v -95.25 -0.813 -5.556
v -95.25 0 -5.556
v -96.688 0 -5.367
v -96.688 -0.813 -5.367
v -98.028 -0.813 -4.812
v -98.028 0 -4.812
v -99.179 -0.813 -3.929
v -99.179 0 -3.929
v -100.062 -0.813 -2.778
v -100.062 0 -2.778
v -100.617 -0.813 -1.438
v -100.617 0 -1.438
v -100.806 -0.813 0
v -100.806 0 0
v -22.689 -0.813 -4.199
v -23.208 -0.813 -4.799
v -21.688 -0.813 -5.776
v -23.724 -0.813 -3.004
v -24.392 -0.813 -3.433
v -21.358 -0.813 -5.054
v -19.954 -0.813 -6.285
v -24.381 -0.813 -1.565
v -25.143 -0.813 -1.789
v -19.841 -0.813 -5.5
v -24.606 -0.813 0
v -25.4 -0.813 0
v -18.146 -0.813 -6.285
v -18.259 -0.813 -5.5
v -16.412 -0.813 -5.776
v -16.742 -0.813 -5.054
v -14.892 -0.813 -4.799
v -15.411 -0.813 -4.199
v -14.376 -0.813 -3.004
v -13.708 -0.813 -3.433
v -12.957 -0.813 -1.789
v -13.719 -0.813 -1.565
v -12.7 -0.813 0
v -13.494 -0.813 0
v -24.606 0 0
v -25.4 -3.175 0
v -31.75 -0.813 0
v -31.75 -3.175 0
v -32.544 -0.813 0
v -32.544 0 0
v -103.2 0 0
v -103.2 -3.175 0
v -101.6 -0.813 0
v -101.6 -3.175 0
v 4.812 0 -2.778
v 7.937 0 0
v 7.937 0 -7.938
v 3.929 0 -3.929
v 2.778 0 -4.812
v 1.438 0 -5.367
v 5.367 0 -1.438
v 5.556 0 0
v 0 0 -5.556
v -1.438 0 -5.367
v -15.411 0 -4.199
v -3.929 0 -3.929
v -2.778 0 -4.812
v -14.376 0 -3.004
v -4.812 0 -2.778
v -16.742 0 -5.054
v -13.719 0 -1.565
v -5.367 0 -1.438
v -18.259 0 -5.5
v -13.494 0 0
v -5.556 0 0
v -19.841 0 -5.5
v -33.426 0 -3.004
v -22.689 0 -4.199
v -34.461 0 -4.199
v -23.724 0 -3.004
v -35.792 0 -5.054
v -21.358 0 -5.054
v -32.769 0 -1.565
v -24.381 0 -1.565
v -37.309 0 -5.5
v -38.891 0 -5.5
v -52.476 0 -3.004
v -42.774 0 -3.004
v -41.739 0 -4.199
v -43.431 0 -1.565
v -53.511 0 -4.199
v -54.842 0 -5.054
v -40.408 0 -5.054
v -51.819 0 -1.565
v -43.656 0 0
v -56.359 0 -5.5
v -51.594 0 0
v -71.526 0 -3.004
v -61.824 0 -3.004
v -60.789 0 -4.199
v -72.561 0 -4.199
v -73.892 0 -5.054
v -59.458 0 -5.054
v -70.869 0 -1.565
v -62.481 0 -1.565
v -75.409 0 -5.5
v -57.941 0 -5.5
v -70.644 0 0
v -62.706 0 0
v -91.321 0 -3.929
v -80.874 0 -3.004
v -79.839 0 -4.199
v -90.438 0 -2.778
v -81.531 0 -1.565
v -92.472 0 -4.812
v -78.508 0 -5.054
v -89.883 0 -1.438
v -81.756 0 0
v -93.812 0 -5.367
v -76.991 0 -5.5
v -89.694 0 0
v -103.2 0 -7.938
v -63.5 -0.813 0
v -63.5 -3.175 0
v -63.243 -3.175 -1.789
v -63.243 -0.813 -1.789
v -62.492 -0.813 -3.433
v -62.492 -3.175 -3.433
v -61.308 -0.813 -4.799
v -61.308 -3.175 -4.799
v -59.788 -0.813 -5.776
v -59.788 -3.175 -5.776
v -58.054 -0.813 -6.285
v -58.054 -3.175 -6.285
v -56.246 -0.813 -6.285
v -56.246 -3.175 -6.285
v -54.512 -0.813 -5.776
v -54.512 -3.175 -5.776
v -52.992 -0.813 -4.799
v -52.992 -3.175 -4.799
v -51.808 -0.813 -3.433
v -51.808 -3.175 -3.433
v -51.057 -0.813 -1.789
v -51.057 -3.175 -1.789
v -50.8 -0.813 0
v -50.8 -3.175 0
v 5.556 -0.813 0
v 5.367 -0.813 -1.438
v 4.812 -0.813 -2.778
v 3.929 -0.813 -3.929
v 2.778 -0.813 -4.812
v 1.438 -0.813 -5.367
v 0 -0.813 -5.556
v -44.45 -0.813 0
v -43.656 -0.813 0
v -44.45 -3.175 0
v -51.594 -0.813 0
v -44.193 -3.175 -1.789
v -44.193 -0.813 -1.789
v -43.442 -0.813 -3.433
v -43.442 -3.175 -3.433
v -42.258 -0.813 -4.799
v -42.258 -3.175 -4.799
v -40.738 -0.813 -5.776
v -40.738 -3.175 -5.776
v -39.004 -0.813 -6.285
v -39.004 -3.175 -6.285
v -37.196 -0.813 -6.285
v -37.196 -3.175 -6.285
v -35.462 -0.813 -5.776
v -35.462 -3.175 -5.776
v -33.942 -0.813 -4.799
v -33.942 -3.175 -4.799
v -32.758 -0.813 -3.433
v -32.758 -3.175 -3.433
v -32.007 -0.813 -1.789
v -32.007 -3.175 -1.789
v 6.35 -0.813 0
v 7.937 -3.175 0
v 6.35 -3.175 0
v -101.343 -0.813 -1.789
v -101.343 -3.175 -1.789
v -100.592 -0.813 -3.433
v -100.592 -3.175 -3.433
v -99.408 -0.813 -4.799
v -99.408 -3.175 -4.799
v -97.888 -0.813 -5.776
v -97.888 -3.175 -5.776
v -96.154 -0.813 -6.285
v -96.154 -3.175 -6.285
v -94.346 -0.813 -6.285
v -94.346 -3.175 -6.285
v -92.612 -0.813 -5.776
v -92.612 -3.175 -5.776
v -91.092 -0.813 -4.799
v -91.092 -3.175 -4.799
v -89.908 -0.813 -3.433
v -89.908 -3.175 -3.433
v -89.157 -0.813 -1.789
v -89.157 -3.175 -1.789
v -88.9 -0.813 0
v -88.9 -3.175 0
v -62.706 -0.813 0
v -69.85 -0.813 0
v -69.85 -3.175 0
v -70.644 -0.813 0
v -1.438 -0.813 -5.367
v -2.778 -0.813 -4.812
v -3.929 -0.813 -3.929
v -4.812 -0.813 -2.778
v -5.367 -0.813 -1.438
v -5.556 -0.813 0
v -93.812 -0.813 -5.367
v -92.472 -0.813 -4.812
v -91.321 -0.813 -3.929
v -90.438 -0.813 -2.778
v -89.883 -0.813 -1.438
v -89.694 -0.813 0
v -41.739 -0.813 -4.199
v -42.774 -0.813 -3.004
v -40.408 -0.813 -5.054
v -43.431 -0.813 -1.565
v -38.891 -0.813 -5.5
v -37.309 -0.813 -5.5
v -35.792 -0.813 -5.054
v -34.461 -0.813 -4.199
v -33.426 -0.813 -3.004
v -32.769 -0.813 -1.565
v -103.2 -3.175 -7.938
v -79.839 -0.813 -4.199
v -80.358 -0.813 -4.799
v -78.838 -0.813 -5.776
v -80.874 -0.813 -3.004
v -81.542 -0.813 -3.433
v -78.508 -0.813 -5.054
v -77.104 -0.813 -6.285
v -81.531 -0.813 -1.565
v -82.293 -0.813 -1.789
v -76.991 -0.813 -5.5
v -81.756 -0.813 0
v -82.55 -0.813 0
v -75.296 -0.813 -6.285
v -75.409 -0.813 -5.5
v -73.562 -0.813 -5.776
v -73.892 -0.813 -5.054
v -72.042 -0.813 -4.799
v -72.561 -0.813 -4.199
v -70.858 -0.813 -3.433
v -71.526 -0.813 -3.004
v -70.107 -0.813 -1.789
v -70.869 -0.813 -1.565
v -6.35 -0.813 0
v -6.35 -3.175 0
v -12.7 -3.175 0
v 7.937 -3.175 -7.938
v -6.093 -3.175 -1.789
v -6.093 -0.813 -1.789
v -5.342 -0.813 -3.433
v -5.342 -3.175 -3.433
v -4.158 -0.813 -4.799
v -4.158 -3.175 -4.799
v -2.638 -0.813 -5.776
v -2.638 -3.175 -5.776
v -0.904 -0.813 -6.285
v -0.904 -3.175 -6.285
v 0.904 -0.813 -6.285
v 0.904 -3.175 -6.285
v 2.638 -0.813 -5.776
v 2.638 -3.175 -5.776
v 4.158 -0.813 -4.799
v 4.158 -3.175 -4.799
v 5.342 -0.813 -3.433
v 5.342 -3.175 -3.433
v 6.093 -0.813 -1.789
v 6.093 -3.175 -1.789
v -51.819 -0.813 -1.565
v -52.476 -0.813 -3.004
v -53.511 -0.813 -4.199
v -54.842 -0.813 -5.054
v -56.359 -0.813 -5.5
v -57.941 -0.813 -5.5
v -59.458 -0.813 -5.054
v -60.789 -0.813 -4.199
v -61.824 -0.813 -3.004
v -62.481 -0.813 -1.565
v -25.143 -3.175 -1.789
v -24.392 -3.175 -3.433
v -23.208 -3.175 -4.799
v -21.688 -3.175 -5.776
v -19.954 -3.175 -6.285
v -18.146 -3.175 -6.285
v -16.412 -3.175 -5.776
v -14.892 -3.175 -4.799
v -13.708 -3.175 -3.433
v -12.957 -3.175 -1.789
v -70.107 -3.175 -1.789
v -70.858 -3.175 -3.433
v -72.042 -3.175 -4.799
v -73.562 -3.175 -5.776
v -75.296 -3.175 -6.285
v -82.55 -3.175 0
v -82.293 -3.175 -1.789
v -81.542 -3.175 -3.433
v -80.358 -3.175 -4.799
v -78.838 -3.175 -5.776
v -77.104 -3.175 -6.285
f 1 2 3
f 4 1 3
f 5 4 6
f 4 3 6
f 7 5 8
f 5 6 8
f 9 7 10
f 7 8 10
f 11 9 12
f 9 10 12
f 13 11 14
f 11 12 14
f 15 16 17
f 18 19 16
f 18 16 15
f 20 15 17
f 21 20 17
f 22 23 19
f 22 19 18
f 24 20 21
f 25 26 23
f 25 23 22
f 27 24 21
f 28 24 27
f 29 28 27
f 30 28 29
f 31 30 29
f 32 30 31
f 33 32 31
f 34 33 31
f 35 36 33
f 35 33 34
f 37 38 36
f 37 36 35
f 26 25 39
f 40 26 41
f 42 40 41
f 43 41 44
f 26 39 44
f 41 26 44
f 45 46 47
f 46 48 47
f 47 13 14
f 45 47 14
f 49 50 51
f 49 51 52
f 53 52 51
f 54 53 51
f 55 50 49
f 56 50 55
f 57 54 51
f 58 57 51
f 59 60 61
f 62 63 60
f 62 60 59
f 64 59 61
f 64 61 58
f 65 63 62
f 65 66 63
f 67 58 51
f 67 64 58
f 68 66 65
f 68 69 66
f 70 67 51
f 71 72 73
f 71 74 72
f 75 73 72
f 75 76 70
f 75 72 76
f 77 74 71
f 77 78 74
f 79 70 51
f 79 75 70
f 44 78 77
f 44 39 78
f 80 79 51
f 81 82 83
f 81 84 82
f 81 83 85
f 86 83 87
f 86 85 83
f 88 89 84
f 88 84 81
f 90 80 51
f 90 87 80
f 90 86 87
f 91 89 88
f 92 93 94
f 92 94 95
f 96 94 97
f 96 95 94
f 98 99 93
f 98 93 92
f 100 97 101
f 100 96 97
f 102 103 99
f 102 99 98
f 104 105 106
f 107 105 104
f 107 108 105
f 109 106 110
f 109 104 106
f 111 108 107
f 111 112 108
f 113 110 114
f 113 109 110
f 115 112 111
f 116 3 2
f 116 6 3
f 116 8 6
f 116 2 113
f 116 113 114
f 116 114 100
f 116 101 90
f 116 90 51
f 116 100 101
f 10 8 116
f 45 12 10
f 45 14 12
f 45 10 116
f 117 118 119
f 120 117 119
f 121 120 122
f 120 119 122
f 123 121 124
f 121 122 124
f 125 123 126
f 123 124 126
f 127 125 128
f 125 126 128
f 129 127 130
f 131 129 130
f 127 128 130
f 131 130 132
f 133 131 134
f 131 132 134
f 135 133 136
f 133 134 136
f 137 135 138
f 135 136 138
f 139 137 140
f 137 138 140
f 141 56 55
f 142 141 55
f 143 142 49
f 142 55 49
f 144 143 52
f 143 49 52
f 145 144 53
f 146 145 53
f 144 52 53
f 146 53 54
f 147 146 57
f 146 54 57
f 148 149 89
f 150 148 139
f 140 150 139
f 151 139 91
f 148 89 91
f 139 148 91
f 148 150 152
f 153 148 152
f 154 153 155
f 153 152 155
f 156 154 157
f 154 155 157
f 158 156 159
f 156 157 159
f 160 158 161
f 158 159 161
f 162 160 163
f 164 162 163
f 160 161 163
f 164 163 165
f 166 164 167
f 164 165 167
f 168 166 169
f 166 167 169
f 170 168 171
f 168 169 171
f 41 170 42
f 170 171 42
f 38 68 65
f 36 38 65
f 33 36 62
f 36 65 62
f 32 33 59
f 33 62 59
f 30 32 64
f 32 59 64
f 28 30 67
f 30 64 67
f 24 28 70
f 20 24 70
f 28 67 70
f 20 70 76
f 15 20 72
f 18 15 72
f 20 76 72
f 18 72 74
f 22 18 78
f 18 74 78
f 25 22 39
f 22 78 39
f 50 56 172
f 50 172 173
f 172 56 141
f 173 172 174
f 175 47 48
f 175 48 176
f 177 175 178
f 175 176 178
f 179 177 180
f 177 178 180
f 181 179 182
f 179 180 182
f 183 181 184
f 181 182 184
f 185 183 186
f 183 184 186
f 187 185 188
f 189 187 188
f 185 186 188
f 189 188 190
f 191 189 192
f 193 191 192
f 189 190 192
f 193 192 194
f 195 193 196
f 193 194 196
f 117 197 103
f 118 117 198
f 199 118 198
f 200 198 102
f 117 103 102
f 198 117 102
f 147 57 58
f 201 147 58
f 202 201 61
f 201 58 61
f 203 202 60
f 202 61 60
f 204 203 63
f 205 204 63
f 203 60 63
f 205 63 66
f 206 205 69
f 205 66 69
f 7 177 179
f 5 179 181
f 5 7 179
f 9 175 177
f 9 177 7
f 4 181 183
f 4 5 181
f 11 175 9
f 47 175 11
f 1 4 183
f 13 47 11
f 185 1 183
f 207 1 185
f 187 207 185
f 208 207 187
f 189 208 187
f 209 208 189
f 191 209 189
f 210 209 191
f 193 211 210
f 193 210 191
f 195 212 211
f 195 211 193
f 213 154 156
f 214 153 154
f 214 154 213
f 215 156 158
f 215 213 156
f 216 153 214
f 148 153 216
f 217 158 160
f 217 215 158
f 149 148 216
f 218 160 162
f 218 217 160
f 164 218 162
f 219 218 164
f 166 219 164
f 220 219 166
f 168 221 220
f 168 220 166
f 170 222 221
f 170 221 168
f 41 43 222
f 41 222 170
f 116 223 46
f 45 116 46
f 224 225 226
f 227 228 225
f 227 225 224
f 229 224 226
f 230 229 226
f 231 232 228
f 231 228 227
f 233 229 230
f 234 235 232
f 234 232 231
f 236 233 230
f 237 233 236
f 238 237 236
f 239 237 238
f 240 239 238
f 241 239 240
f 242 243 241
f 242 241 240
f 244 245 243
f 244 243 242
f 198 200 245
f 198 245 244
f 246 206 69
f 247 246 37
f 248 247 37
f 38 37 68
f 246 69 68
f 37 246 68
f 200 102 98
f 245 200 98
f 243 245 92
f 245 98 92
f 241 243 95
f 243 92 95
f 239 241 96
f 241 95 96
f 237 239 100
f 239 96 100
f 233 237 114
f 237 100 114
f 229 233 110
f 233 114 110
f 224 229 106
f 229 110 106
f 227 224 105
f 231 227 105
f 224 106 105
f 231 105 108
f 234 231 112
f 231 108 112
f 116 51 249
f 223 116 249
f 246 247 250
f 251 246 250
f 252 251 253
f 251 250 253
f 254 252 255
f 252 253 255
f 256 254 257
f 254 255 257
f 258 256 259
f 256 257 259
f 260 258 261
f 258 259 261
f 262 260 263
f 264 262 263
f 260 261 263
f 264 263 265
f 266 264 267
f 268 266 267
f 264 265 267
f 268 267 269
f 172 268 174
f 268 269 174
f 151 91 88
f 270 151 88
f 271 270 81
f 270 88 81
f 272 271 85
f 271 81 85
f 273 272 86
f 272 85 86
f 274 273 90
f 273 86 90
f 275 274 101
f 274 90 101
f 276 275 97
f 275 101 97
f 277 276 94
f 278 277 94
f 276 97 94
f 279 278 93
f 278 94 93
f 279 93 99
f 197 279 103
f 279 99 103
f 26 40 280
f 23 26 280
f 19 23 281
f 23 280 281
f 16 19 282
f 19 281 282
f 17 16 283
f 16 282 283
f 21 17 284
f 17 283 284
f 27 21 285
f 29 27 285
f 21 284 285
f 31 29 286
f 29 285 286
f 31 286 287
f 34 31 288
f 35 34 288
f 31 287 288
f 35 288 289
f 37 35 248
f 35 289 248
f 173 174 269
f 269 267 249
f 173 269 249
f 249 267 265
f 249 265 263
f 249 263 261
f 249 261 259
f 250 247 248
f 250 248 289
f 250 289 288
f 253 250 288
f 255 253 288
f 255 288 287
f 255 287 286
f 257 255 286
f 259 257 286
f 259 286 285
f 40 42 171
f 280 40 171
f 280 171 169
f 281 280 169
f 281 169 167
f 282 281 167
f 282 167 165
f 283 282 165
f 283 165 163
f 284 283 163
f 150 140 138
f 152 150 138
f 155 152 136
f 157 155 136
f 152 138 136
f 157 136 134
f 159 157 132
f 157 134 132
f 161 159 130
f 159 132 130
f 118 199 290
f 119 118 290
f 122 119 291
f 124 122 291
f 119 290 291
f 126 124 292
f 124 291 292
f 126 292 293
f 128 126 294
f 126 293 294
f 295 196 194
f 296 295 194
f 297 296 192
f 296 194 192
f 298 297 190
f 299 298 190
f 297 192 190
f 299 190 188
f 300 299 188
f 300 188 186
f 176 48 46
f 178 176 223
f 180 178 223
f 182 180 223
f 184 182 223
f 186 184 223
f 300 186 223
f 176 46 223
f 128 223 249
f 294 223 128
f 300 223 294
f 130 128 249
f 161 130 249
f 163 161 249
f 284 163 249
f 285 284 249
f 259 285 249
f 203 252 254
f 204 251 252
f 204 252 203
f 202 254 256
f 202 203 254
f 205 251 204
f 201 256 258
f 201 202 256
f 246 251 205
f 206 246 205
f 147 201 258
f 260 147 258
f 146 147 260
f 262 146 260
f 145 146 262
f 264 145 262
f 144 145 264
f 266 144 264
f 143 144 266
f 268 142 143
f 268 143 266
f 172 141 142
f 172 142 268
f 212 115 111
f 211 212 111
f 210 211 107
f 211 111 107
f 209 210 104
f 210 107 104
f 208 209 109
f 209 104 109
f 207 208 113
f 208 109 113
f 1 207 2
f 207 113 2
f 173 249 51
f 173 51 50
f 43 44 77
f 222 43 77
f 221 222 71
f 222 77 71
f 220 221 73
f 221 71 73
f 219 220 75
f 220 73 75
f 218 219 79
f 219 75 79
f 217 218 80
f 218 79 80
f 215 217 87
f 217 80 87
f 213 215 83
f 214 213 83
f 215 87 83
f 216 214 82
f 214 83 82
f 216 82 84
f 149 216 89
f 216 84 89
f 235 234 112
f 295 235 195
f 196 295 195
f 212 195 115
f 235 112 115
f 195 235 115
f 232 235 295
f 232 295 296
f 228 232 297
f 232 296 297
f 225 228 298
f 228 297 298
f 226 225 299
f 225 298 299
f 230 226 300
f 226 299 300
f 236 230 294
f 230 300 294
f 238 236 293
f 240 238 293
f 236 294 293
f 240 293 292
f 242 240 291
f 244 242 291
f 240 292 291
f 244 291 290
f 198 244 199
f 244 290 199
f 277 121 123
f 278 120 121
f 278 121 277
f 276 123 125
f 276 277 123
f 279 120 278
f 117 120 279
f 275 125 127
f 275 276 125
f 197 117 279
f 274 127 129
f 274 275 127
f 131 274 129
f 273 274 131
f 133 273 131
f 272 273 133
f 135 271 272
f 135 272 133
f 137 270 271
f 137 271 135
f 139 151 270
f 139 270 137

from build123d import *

# Parameters (mm, degrees)
F1_DEPTH  = 3.175
F3_DEPTH  = 2.3622
F5_DEPTH  = 1.5875
F7_DEPTH  = 1.5875
F9_DEPTH  = 2.3876
F11_DEPTH = 2.3876
F12_W     = 1.5875
F12_H     = 7.9375
F13_DEPTH = 25.4


with BuildPart() as f1:
    # F0 (on Front) → F1 (new body)
    with BuildSketch(Plane.XZ):
        with BuildLine():
            Line((-103.2002, -7.9375), (-95.25, -7.9375))
            ThreePointArc((-95.25, -7.9375), (-100.8626600757, -5.6126600757), (-103.1875, 0))
            Line((-103.1875, 0), (-103.2002, 0))
            Line((-103.2002, 0), (-103.2002, -7.9375))
        make_face()
        with BuildLine():
            Line((7.9375, -7.9375), (7.9375, 0))
            ThreePointArc((7.9375, 0), (5.6126600757, -5.6126600757), (0, -7.9375))
            Line((0, -7.9375), (7.9375, -7.9375))
        make_face()
        with BuildLine():
            ThreePointArc((0, -7.9375), (-5.6126600757, -5.6126600757), (-7.9375, 0))
            Line((-7.9375, 0), (-11.1125, 0))
            ThreePointArc((-11.1125, 0), (-13.4373399243, -5.6126600757), (-19.05, -7.9375))
            Line((-19.05, -7.9375), (0, -7.9375))
        make_face()
        with BuildLine():
            Line((-38.1, -7.9375), (-19.05, -7.9375))
            ThreePointArc((-19.05, -7.9375), (-24.6626600757, -5.6126600757), (-26.9875, 0))
            Line((-26.9875, 0), (-30.1625, 0))
            ThreePointArc((-30.1625, 0), (-32.4873399243, -5.6126600757), (-38.1, -7.9375))
        make_face()
        with BuildLine():
            Line((-57.1500000951, -7.9375), (-38.1, -7.9375))
            ThreePointArc((-38.1, -7.9375), (-43.7126600757, -5.6126600757), (-46.0375, 0))
            Line((-46.0375, 0), (-49.2125, 0))
            ThreePointArc((-49.2125, 0), (-51.537339958, -5.6126601093), (-57.1500000951, -7.9375))
        make_face()
        with BuildLine():
            Line((-76.2, -7.9375), (-57.1500000951, -7.9375))
            ThreePointArc((-57.1500000951, -7.9375), (-62.7626601093, -5.612660042), (-65.0875, 0))
            Line((-65.0875, 0), (-68.2625, 0))
            ThreePointArc((-68.2625, 0), (-70.5873399243, -5.6126600757), (-76.2, -7.9375))
        make_face()
        with BuildLine():
            Line((-95.25, -7.9375), (-76.2, -7.9375))
            ThreePointArc((-76.2, -7.9375), (-81.8126600757, -5.6126600757), (-84.1375, 0))
            Line((-84.1375, 0), (-87.3125, 0))
            ThreePointArc((-87.3125, 0), (-89.6373399243, -5.6126600757), (-95.25, -7.9375))
        make_face()
        with BuildLine():
            ThreePointArc((0, -6.35), (-4.4901280605, -4.4901280605), (-6.35, 0))
            Line((-6.35, 0), (-7.9375, 0))
            ThreePointArc((-7.9375, 0), (-5.6126600757, -5.6126600757), (0, -7.9375))
            Line((0, -7.9375), (0, -6.35))
        make_face()
        with BuildLine():
            ThreePointArc((-19.05, -7.9375), (-13.4373399243, -5.6126600757), (-11.1125, 0))
            Line((-11.1125, 0), (-12.7, 0))
            ThreePointArc((-12.7, 0), (-19.05, -6.35), (-25.4, 0))
            Line((-25.4, 0), (-26.9875, 0))
            ThreePointArc((-26.9875, 0), (-24.6626600757, -5.6126600757), (-19.05, -7.9375))
        make_face()
        with BuildLine():
            ThreePointArc((-46.0375, 0), (-43.7126600757, -5.6126600757), (-38.1, -7.9375))
            ThreePointArc((-38.1, -7.9375), (-32.4873399243, -5.6126600757), (-30.1625, 0))
            Line((-30.1625, 0), (-31.75, 0))
            ThreePointArc((-31.75, 0), (-38.1, -6.35), (-44.45, 0))
            Line((-44.45, 0), (-46.0375, 0))
        make_face()
        with BuildLine():
            ThreePointArc((-65.0875, 0), (-62.7626601093, -5.612660042), (-57.1500000951, -7.9375))
            ThreePointArc((-57.1500000951, -7.9375), (-51.537339958, -5.6126601093), (-49.2125, 0))
            Line((-49.2125, 0), (-50.8, 0))
            ThreePointArc((-50.8, 0), (-57.15, -6.35), (-63.5, 0))
            Line((-63.5, 0), (-65.0875, 0))
        make_face()
        with BuildLine():
            ThreePointArc((-84.1375, 0), (-81.8126600757, -5.6126600757), (-76.2, -7.9375))
            ThreePointArc((-76.2, -7.9375), (-70.5873399243, -5.6126600757), (-68.2625, 0))
            Line((-68.2625, 0), (-69.85, 0))
            ThreePointArc((-69.85, 0), (-76.2, -6.35), (-82.55, 0))
            Line((-82.55, 0), (-84.1375, 0))
        make_face()
        with BuildLine():
            Line((-95.25, -6.35), (-95.25, -7.9375))
            ThreePointArc((-95.25, -7.9375), (-89.6373399243, -5.6126600757), (-87.3125, 0))
            Line((-87.3125, 0), (-88.9, 0))
            ThreePointArc((-88.9, 0), (-90.7598719395, -4.4901280605), (-95.25, -6.35))
        make_face()
        with BuildLine():
            ThreePointArc((-103.1875, 0), (-100.8626600757, -5.6126600757), (-95.25, -7.9375))
            Line((-95.25, -7.9375), (-95.25, -6.35))
            ThreePointArc((-95.25, -6.35), (-99.7401280605, -4.4901280605), (-101.6, 0))
            Line((-101.6, 0), (-103.1875, 0))
        make_face()
        with BuildLine():
            Line((7.9375, 0), (6.35, 0))
            ThreePointArc((6.35, 0), (4.4901280605, -4.4901280605), (0, -6.35))
            Line((0, -6.35), (0, -7.9375))
            ThreePointArc((0, -7.9375), (5.6126600757, -5.6126600757), (7.9375, 0))
        make_face()
        with BuildLine():
            ThreePointArc((-82.55, 0), (-76.2, -6.35), (-69.85, 0))
            Line((-69.85, 0), (-70.64375, 0))
            ThreePointArc((-70.64375, 0), (-76.2, -5.55625), (-81.75625, 0))
            Line((-81.75625, 0), (-82.55, 0))
        make_face()
        with BuildLine():
            ThreePointArc((-63.5, 0), (-57.15, -6.35), (-50.8, 0))
            Line((-50.8, 0), (-51.59375, 0))
            ThreePointArc((-51.59375, 0), (-57.15, -5.55625), (-62.70625, 0))
            Line((-62.70625, 0), (-63.5, 0))
        make_face()
        with BuildLine():
            ThreePointArc((-44.45, 0), (-38.1, -6.35), (-31.75, 0))
            Line((-31.75, 0), (-32.54375, 0))
            ThreePointArc((-32.54375, 0), (-38.1, -5.55625), (-43.65625, 0))
            Line((-43.65625, 0), (-44.45, 0))
        make_face()
        with BuildLine():
            ThreePointArc((-25.4, 0), (-19.05, -6.35), (-12.7, 0))
            Line((-12.7, 0), (-13.49375, 0))
            ThreePointArc((-13.49375, 0), (-19.05, -5.55625), (-24.60625, 0))
            Line((-24.60625, 0), (-25.4, 0))
        make_face()
        with BuildLine():
            ThreePointArc((0, -5.55625), (-3.928862053, -3.928862053), (-5.55625, 0))
            Line((-5.55625, 0), (-6.35, 0))
            ThreePointArc((-6.35, 0), (-4.4901280605, -4.4901280605), (0, -6.35))
            Line((0, -6.35), (0, -5.55625))
        make_face()
        with BuildLine():
            Line((6.35, 0), (5.55625, 0))
            ThreePointArc((5.55625, 0), (3.928862053, -3.928862053), (0, -5.55625))
            Line((0, -5.55625), (0, -6.35))
            ThreePointArc((0, -6.35), (4.4901280605, -4.4901280605), (6.35, 0))
        make_face()
        with BuildLine():
            Line((-95.25, -5.55625), (-95.25, -6.35))
            ThreePointArc((-95.25, -6.35), (-90.7598719395, -4.4901280605), (-88.9, 0))
            Line((-88.9, 0), (-89.69375, 0))
            ThreePointArc((-89.69375, 0), (-91.321137947, -3.928862053), (-95.25, -5.55625))
        make_face()
        with BuildLine():
            ThreePointArc((-101.6, 0), (-99.7401280605, -4.4901280605), (-95.25, -6.35))
            Line((-95.25, -6.35), (-95.25, -5.55625))
            ThreePointArc((-95.25, -5.55625), (-99.178862053, -3.928862053), (-100.80625, 0))
            Line((-100.80625, 0), (-101.6, 0))
        make_face()
    extrude(amount=F1_DEPTH)

    # F2 (on face) → F3 (cut)
    with BuildSketch(Plane.XZ.offset(3.175)):
        with BuildLine():
            ThreePointArc((-101.6, 0), (-95.25, -6.35), (-88.9, 0))
            ThreePointArc((-88.9, 0), (-95.25, 6.35), (-101.6, 0))
        make_face()
        with BuildLine():
            ThreePointArc((-82.55, 0), (-76.2, -6.35), (-69.85, 0))
            ThreePointArc((-69.85, 0), (-76.2, 6.35), (-82.55, 0))
        make_face()
        with BuildLine():
            ThreePointArc((-63.5, 0), (-57.15, -6.35), (-50.8, 0))
            ThreePointArc((-50.8, 0), (-57.15, 6.35), (-63.5, 0))
        make_face()
        with BuildLine():
            ThreePointArc((-44.45, 0), (-38.1, -6.35), (-31.75, 0))
            ThreePointArc((-31.75, 0), (-38.1, 6.35), (-44.45, 0))
        make_face()
        with BuildLine():
            ThreePointArc((-25.4, 0), (-19.05, -6.35), (-12.7, 0))
            ThreePointArc((-12.7, 0), (-19.05, 6.35), (-25.4, 0))
        make_face()
        with BuildLine():
            ThreePointArc((-6.35, 0), (0, -6.35), (6.35, 0))
            ThreePointArc((6.35, 0), (0, 6.35), (-6.35, 0))
        make_face()
    extrude(amount=-F3_DEPTH, mode=Mode.SUBTRACT)

    # F4 (on face) → F5 (join)
    with BuildSketch(Plane.YZ.offset(7.9375)):
        Polygon((-2.38125, 0), (-3.175, 0), (-3.175, -7.9375), (0, -7.9375), (0, 0), (-0.79375, 0), (-0.79375, -3.175), (-0.79375, -4.7625), (-2.38125, -4.7625), (-2.38125, -3.175), align=None)
    extrude(amount=F5_DEPTH)

    # F6 (on face) → F7 (join)
    with BuildSketch(Plane(origin=(-103.2002, 0, 0), x_dir=(0, -1, 0), z_dir=(-1, 0, 0))):
        Polygon((0.79375, 0), (0, 0), (0, -7.9375), (3.175, -7.9375), (3.175, 0), (2.38125, 0), (2.38125, -3.175), (2.38125, -4.7625), (0.79375, -4.7625), (0.79375, -3.175), align=None)
    extrude(amount=F7_DEPTH)

    # F8 (on face) → F9 (join)
    with BuildSketch(Plane(origin=(0, 0, 0), x_dir=(-1, 0, 0), z_dir=(0, 1, 0))):
        Polygon((-7.9375, -3.175), (-7.9375, 0), (-9.525, -3.175), align=None)
    extrude(amount=-F9_DEPTH)

    # F10 (on face) → F11 (join)
    with BuildSketch(Plane(origin=(0, 0, 0), x_dir=(-1, 0, 0), z_dir=(0, 1, 0))):
        Polygon((104.7877, -3.175), (103.99395, 0), (103.99395, -3.175), align=None)
    extrude(amount=-F11_DEPTH)

    # F12 (on face) → F13 (cut)
    with BuildSketch(Plane.XZ.offset(3.175)):
        with Locations((8.73125, -3.96875)):
            Rectangle(F12_W, F12_H)
        with Locations((-103.99395, -3.96875)):
            Rectangle(F12_W, F12_H)
    extrude(amount=-F13_DEPTH, mode=Mode.SUBTRACT)


solid = f1.part
